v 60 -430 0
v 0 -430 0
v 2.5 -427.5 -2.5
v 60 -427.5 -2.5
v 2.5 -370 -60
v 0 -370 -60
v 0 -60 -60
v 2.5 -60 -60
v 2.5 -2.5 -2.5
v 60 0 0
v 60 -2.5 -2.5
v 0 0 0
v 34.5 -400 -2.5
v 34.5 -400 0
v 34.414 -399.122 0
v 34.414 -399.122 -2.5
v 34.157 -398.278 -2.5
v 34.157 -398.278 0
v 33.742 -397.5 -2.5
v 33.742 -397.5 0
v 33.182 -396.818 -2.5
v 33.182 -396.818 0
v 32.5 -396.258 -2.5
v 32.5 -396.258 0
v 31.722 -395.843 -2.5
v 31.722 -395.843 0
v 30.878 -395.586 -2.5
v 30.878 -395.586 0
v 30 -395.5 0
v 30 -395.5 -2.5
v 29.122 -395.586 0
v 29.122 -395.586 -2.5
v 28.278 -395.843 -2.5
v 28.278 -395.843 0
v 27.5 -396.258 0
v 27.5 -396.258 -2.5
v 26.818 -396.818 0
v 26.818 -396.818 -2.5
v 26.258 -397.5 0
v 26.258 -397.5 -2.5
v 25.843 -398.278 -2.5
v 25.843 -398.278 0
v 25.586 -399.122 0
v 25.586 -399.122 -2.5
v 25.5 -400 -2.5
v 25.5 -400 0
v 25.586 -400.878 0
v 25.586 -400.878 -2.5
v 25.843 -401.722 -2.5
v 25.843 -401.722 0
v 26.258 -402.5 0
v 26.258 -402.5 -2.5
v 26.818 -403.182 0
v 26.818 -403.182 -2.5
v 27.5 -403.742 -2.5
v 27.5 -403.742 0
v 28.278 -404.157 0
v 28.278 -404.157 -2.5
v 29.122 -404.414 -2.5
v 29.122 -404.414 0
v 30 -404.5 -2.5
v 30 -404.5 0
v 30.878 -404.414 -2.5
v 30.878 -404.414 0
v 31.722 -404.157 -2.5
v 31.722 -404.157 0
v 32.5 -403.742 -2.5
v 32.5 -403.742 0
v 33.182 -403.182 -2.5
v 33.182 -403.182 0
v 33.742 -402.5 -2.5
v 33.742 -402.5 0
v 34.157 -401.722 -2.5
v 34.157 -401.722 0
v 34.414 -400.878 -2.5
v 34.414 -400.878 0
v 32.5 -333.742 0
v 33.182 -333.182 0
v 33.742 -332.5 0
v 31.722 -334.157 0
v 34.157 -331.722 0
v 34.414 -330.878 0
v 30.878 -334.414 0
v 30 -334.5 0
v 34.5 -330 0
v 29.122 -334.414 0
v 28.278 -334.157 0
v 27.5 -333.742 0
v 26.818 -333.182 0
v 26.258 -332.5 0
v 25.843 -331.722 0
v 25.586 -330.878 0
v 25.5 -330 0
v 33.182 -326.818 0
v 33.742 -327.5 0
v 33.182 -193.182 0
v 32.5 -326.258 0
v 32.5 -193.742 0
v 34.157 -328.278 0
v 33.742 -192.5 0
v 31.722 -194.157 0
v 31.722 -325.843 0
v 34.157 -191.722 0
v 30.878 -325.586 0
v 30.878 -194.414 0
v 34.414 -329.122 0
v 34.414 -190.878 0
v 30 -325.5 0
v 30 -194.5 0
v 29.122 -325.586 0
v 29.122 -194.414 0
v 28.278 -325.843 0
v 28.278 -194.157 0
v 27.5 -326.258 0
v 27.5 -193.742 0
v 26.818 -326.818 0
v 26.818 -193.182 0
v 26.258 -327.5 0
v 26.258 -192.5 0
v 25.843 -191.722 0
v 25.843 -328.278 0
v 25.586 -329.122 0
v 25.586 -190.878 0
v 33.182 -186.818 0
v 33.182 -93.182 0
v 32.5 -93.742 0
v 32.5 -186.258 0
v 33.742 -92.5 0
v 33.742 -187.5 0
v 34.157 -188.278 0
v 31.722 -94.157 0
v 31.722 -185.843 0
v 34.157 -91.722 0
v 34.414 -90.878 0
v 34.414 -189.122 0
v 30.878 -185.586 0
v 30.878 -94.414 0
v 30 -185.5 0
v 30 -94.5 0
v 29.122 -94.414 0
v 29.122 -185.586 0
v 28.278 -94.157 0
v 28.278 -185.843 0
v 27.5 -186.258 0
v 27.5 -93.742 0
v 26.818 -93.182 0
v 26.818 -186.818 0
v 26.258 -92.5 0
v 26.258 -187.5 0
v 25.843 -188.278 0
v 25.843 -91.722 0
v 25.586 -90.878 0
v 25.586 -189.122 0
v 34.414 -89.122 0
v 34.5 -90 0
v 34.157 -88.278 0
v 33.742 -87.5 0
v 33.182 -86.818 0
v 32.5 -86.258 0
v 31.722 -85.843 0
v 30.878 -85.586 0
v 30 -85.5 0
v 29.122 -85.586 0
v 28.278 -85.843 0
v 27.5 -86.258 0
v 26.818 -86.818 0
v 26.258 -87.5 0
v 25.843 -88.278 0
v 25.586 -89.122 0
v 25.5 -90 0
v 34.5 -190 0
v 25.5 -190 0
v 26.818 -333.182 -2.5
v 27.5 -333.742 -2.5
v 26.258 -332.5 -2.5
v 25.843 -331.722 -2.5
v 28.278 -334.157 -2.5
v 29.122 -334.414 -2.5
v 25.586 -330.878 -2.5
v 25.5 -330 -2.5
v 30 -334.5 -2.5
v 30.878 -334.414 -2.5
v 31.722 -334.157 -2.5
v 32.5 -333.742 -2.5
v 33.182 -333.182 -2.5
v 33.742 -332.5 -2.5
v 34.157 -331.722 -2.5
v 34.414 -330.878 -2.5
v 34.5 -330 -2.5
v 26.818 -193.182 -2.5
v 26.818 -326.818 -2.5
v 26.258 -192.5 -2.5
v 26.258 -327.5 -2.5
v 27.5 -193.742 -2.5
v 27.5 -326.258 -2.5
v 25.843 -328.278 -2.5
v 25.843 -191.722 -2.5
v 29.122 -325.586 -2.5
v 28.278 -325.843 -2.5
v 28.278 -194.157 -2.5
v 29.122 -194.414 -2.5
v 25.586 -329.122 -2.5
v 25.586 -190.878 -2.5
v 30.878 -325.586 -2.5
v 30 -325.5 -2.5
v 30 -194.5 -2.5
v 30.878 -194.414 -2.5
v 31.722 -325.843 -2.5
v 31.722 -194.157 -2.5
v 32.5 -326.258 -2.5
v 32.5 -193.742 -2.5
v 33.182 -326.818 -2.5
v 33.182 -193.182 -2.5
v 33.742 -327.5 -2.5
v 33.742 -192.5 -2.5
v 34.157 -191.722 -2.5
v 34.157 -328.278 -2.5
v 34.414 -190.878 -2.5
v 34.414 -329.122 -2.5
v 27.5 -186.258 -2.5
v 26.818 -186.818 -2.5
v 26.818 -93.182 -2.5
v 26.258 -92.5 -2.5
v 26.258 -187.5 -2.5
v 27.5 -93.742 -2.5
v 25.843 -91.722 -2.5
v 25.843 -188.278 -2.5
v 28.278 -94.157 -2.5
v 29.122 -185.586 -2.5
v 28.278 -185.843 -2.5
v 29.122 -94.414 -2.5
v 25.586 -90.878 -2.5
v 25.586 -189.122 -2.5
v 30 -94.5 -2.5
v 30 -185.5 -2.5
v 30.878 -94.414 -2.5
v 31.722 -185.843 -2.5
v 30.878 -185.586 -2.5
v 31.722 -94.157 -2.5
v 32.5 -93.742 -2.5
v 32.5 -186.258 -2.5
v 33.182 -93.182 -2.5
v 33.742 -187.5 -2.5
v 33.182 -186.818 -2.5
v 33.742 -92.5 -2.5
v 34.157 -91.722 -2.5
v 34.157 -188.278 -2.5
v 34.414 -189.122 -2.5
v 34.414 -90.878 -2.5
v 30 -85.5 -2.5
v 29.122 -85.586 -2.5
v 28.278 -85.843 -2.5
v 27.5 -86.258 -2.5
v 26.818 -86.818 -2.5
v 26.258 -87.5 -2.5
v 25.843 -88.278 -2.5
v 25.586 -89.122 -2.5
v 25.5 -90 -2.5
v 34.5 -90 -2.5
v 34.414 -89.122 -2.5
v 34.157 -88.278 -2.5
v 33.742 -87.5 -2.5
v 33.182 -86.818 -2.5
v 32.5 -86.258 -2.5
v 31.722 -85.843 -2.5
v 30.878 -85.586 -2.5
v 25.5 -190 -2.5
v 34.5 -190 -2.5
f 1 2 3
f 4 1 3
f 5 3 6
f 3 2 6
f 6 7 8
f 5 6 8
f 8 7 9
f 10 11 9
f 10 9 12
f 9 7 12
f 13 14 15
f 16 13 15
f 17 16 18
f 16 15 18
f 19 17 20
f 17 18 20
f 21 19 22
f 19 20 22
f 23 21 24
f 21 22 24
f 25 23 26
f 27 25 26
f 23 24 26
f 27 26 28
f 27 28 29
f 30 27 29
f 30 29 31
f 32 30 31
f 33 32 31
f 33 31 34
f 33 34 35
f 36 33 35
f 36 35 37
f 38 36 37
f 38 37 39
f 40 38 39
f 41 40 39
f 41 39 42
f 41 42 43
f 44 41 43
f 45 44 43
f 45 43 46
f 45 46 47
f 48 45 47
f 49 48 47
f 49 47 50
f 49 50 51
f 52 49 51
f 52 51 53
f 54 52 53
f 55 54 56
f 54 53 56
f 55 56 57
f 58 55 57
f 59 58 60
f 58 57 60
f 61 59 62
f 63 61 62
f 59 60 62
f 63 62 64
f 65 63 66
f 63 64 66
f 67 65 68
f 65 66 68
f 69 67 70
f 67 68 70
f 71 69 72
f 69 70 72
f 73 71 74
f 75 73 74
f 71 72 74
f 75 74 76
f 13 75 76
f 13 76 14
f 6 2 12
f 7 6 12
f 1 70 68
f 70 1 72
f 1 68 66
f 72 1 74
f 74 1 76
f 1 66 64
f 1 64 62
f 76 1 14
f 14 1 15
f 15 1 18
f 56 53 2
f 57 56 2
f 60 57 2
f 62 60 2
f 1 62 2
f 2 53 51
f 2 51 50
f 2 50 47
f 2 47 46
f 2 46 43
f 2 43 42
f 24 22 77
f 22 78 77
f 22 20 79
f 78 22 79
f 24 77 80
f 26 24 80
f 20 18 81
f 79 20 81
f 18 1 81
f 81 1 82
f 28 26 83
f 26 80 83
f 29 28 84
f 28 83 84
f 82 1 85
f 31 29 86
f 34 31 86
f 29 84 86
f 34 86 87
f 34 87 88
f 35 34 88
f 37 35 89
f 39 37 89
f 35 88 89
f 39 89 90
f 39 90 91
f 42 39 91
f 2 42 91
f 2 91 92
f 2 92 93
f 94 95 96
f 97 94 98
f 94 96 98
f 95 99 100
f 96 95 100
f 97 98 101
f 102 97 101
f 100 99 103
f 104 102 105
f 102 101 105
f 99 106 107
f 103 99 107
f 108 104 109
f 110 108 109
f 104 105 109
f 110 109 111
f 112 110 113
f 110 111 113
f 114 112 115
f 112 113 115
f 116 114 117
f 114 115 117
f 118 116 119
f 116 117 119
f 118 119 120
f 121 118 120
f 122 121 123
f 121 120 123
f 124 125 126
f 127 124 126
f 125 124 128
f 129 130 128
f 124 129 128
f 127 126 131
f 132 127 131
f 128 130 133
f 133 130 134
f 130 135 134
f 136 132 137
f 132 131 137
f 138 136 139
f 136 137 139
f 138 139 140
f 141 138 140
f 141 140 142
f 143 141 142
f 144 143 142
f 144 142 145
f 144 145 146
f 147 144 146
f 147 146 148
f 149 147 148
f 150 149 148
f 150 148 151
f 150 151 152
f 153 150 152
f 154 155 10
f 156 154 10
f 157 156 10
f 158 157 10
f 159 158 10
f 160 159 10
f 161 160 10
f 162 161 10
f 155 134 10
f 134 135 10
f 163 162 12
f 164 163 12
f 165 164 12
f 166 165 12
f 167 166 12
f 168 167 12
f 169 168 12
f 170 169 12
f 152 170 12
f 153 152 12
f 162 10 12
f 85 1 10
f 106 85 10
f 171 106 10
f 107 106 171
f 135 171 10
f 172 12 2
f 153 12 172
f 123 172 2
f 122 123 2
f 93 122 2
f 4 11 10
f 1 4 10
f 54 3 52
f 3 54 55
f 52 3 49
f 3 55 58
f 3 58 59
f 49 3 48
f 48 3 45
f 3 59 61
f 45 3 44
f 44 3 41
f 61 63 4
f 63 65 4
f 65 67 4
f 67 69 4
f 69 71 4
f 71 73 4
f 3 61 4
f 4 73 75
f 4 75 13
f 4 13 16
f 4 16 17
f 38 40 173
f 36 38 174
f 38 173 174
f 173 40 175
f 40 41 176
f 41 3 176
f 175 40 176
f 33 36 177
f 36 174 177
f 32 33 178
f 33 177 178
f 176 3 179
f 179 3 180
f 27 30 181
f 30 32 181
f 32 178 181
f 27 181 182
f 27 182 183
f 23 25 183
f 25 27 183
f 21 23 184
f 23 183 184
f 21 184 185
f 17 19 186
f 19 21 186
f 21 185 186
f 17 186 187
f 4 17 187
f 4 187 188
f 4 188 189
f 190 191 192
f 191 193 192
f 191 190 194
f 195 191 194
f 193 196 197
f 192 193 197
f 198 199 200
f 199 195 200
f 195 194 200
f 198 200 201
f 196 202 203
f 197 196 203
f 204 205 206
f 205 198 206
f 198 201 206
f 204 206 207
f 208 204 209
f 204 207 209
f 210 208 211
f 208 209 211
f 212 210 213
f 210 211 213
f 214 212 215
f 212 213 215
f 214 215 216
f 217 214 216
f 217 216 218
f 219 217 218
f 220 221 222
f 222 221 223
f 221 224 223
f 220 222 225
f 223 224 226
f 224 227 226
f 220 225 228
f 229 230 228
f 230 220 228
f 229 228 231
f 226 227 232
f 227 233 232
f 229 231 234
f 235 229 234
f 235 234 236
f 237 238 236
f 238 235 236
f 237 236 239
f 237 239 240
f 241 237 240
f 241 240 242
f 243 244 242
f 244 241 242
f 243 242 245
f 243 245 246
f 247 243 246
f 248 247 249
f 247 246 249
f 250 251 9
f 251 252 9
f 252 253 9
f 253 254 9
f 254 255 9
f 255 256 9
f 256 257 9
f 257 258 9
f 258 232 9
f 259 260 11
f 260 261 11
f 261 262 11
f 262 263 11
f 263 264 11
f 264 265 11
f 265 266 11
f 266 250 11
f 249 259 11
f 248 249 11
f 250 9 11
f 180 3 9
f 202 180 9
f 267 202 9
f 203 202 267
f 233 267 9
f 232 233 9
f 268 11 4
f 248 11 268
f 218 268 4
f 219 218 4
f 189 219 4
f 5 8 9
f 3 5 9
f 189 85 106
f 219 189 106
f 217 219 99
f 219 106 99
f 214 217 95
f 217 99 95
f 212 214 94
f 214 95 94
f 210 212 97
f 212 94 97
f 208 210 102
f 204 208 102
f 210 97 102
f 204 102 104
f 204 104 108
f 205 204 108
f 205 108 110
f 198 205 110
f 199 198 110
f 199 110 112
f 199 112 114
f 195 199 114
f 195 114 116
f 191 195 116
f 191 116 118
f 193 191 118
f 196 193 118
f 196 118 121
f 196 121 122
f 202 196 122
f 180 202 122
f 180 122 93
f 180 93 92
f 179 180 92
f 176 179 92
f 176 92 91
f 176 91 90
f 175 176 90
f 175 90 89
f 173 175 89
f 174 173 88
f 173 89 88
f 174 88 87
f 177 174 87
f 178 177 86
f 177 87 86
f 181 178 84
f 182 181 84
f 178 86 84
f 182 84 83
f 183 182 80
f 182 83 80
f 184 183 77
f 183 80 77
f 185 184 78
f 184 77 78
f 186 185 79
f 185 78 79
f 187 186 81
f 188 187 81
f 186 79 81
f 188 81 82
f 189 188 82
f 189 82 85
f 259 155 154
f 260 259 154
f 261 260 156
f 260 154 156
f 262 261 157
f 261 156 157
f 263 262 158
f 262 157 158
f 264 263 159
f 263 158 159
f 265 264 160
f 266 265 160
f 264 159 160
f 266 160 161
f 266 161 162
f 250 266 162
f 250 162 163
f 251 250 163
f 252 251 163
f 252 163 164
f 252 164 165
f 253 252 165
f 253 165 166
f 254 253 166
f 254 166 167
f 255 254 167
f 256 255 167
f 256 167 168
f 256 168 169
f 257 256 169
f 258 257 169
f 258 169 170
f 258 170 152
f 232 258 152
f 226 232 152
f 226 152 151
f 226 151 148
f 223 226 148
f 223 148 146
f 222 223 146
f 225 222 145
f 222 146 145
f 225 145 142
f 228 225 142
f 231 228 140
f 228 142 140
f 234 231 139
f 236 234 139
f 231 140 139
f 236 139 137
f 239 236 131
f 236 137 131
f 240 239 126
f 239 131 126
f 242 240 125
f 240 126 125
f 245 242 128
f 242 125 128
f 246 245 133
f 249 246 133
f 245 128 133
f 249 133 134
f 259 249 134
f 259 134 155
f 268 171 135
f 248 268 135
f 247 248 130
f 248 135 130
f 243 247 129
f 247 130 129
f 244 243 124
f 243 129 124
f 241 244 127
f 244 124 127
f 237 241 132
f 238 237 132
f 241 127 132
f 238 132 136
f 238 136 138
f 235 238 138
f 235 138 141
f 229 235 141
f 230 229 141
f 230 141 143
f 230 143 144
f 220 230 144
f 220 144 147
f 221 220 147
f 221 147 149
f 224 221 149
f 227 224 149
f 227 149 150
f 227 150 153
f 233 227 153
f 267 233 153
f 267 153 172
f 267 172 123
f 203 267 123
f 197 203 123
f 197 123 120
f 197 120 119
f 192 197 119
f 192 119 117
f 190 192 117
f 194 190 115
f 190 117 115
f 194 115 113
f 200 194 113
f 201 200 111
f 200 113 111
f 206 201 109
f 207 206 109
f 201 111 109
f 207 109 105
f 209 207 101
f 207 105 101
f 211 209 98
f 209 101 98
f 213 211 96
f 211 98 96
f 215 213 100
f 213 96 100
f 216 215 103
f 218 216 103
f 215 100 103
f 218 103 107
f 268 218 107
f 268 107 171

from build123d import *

# Parameters (mm, degrees)
F1_DEPTH = 430
F3_DEPTH = 60.001
F4_R     = 4.5
F5_DEPTH = 60.001


with BuildPart() as f1:
    # F0 (on Front) → F1 (new body)
    with BuildSketch(Plane.XZ):
        Polygon((60, 0), (0, 0), (0, -60), (2.5, -60), (2.5, -2.5), (60, -2.5), align=None)
    extrude(amount=F1_DEPTH)

    # F2 (on face) → F3 (cut, through all)
    with BuildSketch(Plane(origin=(0, 0, 0), x_dir=(0, -1, 0), z_dir=(-1, 0, 0))):
        Polygon((0, 0), (0, -60), (60, -60), align=None)
        Polygon((370, -60), (430, -60), (430, 0), align=None)
    extrude(amount=-F3_DEPTH, mode=Mode.SUBTRACT)

    # F4 (on face) → F5 (cut, through all)
    with BuildSketch(Plane.XY):
        with Locations((30, -90)):
            Circle(F4_R)
        with Locations((30, -190)):
            Circle(F4_R)
        with Locations((30, -330)):
            Circle(F4_R)
        with Locations((30, -400)):
            Circle(F4_R)
    extrude(amount=-F5_DEPTH, mode=Mode.SUBTRACT)


solid = f1.part
